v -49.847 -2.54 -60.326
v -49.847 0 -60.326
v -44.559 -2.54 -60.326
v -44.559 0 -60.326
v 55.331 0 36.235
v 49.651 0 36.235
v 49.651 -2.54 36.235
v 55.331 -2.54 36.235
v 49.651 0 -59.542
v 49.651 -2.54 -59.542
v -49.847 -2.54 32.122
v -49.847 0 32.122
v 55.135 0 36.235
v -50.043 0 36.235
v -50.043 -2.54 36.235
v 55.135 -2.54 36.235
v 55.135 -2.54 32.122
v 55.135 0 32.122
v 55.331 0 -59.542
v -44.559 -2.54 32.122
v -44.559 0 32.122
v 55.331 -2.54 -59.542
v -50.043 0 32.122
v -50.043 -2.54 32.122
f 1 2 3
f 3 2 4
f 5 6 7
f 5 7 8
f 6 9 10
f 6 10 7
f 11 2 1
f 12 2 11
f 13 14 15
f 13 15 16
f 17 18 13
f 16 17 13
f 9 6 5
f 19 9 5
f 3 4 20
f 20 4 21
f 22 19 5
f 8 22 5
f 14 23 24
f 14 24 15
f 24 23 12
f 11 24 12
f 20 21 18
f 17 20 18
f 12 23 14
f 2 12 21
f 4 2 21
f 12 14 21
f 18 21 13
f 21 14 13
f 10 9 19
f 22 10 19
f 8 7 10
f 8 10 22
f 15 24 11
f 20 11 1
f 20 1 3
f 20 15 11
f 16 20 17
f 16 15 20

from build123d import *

# Parameters (mm, degrees)
F0_W     = 5.288299
F0_H     = 96.168689
F1_DEPTH = 2.54
F2_W     = 105.178383
F2_H     = 4.113123
F3_DEPTH = 2.54
F4_W     = 5.680029
F4_H     = 95.776964
F5_DEPTH = 2.54


with BuildPart() as f1:
    # F0 (on Front) → F1 (new body)
    with BuildSketch(Plane.XZ):
        with Locations((-47.202962, -12.24143)):
            Rectangle(F0_W, F0_H)
    extrude(amount=F1_DEPTH)

    # F2 (on Front) → F3 (join)
    with BuildSketch(Plane.XZ):
        with Locations((2.546216, 34.178078)):
            Rectangle(F2_W, F2_H)
    extrude(amount=F3_DEPTH)


with BuildPart() as f5:
    # F4 (on Front) → F5 (new body)
    with BuildSketch(Plane.XZ):
        with Locations((52.491264, -11.653842)):
            Rectangle(F4_W, F4_H)
    extrude(amount=F5_DEPTH)


solid = Compound([f1.part, f5.part])
